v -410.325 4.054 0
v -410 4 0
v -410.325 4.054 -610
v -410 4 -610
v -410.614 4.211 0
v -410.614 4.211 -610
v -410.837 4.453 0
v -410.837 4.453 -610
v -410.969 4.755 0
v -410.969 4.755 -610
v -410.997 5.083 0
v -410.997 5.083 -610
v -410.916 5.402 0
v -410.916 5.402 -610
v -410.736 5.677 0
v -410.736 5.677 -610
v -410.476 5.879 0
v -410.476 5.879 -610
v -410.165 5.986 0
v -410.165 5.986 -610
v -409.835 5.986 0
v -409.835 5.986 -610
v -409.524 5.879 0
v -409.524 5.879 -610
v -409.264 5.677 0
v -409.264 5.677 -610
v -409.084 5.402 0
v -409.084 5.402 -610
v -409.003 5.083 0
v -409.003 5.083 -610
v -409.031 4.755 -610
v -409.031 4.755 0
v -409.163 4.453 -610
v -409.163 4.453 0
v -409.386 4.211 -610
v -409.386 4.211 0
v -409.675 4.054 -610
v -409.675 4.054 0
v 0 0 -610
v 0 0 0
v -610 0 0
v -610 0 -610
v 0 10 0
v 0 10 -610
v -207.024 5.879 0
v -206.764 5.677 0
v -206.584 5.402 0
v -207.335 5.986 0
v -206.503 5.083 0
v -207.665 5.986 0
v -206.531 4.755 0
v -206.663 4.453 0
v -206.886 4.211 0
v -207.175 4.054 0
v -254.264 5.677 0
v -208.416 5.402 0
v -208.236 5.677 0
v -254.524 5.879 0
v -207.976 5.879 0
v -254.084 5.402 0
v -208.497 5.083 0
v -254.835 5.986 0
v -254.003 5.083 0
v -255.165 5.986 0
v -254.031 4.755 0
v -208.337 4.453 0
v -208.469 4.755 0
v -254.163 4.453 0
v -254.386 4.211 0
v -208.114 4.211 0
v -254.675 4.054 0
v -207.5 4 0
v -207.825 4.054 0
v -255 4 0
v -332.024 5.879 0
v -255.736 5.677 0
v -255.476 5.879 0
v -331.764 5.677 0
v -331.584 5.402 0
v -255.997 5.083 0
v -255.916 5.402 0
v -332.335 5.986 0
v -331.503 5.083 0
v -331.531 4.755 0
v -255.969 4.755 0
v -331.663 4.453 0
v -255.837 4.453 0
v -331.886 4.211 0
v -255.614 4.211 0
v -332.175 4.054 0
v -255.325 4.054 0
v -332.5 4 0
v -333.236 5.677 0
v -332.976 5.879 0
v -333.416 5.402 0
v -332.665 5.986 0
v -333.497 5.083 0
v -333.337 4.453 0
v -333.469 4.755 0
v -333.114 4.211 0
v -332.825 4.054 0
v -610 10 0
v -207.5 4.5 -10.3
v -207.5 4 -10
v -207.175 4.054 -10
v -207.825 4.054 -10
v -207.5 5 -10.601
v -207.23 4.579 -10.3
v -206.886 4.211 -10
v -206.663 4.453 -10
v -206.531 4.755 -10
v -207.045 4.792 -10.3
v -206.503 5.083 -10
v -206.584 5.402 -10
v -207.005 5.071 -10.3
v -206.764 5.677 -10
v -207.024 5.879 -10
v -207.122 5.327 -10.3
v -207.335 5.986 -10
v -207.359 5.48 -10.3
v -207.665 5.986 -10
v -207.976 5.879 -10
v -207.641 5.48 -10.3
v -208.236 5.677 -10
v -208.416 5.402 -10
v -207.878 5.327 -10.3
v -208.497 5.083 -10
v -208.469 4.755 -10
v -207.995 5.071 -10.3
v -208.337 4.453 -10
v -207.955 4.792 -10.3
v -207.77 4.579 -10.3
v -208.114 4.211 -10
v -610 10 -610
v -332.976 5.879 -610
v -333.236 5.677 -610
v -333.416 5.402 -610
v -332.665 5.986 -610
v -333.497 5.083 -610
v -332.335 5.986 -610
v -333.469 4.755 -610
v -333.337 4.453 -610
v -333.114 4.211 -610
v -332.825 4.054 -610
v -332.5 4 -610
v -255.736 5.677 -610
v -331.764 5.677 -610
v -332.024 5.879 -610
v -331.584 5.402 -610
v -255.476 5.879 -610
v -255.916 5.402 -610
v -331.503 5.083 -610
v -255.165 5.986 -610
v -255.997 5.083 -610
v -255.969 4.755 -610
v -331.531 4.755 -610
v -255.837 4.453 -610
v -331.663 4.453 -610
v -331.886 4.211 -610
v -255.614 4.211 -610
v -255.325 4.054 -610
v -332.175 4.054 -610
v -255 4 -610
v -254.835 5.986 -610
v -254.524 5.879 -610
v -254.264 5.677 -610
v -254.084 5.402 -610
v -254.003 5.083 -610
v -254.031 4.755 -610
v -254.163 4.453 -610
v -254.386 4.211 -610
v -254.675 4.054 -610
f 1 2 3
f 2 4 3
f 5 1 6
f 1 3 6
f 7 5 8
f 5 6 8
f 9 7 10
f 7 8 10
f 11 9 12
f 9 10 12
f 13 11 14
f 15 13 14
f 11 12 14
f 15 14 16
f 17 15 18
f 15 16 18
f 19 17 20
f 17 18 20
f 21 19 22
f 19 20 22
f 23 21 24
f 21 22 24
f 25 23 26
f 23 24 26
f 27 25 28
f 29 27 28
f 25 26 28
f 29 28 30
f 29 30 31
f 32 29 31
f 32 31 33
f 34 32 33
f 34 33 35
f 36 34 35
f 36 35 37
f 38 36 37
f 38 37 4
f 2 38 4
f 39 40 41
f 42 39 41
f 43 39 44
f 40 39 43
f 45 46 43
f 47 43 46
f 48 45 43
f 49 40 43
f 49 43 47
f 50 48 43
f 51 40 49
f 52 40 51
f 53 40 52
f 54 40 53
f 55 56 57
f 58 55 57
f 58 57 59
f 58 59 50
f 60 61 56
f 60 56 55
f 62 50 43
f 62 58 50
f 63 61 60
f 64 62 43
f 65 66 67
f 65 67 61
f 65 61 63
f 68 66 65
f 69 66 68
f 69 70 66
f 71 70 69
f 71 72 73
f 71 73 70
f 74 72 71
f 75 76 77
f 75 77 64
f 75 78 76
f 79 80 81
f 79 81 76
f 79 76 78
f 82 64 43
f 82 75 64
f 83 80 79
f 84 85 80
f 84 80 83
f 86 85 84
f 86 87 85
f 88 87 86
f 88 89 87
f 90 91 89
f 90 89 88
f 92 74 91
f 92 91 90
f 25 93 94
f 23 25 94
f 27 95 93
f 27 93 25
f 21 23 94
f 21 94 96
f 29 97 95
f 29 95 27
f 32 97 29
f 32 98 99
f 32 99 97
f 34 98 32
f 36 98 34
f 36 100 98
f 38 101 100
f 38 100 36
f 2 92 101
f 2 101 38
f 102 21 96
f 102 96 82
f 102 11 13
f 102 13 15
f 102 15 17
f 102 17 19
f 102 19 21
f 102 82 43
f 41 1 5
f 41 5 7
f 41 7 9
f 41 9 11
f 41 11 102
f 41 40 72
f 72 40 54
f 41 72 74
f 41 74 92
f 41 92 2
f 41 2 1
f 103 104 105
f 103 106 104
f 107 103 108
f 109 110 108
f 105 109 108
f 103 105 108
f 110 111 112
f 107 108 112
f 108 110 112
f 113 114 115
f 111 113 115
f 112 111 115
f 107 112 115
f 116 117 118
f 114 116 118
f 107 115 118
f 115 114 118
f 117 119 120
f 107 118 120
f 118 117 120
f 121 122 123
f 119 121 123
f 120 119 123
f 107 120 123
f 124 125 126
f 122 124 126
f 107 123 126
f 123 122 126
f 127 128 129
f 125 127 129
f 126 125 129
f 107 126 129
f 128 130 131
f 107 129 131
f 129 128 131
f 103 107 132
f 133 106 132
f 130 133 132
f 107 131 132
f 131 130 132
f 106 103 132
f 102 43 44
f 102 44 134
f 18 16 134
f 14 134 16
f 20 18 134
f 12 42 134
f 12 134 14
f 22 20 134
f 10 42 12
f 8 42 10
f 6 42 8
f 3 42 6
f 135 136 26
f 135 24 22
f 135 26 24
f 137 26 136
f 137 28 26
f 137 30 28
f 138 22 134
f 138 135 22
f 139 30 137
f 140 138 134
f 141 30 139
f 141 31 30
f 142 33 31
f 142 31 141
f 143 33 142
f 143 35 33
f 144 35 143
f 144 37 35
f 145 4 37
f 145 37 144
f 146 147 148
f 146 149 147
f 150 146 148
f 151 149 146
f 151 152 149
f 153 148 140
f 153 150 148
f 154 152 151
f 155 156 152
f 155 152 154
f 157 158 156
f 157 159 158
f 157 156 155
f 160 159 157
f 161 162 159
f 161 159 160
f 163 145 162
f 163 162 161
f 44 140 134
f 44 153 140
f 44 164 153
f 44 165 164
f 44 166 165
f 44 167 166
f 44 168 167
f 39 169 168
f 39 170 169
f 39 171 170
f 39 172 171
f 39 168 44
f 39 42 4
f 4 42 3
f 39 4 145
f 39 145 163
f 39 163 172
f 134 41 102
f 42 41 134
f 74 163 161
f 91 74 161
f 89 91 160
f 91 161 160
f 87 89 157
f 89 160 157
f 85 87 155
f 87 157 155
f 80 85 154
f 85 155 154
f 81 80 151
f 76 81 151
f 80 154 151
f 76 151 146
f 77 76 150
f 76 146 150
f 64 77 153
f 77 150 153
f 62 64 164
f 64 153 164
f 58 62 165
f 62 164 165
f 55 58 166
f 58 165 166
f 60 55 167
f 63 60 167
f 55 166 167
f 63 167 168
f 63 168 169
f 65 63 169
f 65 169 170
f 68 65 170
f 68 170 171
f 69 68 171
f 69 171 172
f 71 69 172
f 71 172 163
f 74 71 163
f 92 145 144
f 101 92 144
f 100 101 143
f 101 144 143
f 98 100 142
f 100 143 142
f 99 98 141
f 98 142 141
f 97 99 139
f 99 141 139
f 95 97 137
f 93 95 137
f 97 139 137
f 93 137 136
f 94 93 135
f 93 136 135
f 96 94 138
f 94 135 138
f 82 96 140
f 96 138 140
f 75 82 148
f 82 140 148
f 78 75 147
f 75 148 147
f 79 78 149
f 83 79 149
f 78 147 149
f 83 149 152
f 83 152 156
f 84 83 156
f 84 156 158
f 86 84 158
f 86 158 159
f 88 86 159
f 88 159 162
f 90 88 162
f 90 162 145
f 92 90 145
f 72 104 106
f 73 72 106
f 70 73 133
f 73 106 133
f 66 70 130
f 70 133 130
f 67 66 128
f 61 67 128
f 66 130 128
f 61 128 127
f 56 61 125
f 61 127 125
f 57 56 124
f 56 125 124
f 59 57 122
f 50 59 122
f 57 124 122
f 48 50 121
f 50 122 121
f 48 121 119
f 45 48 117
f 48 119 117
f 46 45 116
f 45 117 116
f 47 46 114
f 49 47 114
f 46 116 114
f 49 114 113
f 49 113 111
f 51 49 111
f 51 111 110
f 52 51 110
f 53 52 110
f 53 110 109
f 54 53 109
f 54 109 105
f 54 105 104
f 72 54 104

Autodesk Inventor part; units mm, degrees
ref_plane "YZ Plane" through (0, 0, 0) normal (1, 0, 0) x (0, 1, 0)
ref_plane "XZ Plane" through (0, 0, 0) normal (0, 1, 0) x (-1, 0, 0)
ref_plane "XY Plane" through (0, 0, 0) normal (0, 0, 1) x (1, 0, 0)
sketch "Sketch1" plane through (0, 0, 0) normal (0, 1, 0) x (-1, 0, 0)
  line L0 (0, 0) -> (610, 0)
  line L1 (610, 0) -> (610, -610)
  line L2 (610, -610) -> (0, -610)
  line L3 (0, -610) -> (0, 0)
  dimension "d0" = 610
  dimension "d1" = 610
extrude "Extrusion1" add sketch "Sketch1" along normal blind 10
sketch "Sketch2" plane through (-610, 0, 0) normal (0, 0, 1) x (1, 0, 0)
  line L0 (0, 0) -> (610, 0) projected
  line L1 (0, 0) -> (0, 10) projected
  point P0 (200, 5)
  dimension "d4" = 5
  dimension "d5" = 200
hole "Hole1" at (-410, 5, 0) direction (0, 0, -1) diameter 2 end through all
pattern_linear "Rectangular Pattern2" count 2 spacing 155 along (1, 0, 0) of "Hole1"
sketch "Sketch4" plane through (-610, 0, 0) normal (0, 0, 1) x (1, 0, 0)
  line L0 (0, 0) -> (610, 0) projected
  line L1 (610, 0) -> (610, 10) projected
  point P0 (402.5, 5)
  dimension "d28" = 5
  dimension "d29" = 207.5
hole "Hole3" at (-207.5, 5, 0) direction (0, 0, -1) diameter 2 depth 10 tip angle 118
pattern_linear "Rectangular Pattern3" count 2 spacing 77.5 along (1, 0, 0) of "Hole1"
properties part number "BASE"
